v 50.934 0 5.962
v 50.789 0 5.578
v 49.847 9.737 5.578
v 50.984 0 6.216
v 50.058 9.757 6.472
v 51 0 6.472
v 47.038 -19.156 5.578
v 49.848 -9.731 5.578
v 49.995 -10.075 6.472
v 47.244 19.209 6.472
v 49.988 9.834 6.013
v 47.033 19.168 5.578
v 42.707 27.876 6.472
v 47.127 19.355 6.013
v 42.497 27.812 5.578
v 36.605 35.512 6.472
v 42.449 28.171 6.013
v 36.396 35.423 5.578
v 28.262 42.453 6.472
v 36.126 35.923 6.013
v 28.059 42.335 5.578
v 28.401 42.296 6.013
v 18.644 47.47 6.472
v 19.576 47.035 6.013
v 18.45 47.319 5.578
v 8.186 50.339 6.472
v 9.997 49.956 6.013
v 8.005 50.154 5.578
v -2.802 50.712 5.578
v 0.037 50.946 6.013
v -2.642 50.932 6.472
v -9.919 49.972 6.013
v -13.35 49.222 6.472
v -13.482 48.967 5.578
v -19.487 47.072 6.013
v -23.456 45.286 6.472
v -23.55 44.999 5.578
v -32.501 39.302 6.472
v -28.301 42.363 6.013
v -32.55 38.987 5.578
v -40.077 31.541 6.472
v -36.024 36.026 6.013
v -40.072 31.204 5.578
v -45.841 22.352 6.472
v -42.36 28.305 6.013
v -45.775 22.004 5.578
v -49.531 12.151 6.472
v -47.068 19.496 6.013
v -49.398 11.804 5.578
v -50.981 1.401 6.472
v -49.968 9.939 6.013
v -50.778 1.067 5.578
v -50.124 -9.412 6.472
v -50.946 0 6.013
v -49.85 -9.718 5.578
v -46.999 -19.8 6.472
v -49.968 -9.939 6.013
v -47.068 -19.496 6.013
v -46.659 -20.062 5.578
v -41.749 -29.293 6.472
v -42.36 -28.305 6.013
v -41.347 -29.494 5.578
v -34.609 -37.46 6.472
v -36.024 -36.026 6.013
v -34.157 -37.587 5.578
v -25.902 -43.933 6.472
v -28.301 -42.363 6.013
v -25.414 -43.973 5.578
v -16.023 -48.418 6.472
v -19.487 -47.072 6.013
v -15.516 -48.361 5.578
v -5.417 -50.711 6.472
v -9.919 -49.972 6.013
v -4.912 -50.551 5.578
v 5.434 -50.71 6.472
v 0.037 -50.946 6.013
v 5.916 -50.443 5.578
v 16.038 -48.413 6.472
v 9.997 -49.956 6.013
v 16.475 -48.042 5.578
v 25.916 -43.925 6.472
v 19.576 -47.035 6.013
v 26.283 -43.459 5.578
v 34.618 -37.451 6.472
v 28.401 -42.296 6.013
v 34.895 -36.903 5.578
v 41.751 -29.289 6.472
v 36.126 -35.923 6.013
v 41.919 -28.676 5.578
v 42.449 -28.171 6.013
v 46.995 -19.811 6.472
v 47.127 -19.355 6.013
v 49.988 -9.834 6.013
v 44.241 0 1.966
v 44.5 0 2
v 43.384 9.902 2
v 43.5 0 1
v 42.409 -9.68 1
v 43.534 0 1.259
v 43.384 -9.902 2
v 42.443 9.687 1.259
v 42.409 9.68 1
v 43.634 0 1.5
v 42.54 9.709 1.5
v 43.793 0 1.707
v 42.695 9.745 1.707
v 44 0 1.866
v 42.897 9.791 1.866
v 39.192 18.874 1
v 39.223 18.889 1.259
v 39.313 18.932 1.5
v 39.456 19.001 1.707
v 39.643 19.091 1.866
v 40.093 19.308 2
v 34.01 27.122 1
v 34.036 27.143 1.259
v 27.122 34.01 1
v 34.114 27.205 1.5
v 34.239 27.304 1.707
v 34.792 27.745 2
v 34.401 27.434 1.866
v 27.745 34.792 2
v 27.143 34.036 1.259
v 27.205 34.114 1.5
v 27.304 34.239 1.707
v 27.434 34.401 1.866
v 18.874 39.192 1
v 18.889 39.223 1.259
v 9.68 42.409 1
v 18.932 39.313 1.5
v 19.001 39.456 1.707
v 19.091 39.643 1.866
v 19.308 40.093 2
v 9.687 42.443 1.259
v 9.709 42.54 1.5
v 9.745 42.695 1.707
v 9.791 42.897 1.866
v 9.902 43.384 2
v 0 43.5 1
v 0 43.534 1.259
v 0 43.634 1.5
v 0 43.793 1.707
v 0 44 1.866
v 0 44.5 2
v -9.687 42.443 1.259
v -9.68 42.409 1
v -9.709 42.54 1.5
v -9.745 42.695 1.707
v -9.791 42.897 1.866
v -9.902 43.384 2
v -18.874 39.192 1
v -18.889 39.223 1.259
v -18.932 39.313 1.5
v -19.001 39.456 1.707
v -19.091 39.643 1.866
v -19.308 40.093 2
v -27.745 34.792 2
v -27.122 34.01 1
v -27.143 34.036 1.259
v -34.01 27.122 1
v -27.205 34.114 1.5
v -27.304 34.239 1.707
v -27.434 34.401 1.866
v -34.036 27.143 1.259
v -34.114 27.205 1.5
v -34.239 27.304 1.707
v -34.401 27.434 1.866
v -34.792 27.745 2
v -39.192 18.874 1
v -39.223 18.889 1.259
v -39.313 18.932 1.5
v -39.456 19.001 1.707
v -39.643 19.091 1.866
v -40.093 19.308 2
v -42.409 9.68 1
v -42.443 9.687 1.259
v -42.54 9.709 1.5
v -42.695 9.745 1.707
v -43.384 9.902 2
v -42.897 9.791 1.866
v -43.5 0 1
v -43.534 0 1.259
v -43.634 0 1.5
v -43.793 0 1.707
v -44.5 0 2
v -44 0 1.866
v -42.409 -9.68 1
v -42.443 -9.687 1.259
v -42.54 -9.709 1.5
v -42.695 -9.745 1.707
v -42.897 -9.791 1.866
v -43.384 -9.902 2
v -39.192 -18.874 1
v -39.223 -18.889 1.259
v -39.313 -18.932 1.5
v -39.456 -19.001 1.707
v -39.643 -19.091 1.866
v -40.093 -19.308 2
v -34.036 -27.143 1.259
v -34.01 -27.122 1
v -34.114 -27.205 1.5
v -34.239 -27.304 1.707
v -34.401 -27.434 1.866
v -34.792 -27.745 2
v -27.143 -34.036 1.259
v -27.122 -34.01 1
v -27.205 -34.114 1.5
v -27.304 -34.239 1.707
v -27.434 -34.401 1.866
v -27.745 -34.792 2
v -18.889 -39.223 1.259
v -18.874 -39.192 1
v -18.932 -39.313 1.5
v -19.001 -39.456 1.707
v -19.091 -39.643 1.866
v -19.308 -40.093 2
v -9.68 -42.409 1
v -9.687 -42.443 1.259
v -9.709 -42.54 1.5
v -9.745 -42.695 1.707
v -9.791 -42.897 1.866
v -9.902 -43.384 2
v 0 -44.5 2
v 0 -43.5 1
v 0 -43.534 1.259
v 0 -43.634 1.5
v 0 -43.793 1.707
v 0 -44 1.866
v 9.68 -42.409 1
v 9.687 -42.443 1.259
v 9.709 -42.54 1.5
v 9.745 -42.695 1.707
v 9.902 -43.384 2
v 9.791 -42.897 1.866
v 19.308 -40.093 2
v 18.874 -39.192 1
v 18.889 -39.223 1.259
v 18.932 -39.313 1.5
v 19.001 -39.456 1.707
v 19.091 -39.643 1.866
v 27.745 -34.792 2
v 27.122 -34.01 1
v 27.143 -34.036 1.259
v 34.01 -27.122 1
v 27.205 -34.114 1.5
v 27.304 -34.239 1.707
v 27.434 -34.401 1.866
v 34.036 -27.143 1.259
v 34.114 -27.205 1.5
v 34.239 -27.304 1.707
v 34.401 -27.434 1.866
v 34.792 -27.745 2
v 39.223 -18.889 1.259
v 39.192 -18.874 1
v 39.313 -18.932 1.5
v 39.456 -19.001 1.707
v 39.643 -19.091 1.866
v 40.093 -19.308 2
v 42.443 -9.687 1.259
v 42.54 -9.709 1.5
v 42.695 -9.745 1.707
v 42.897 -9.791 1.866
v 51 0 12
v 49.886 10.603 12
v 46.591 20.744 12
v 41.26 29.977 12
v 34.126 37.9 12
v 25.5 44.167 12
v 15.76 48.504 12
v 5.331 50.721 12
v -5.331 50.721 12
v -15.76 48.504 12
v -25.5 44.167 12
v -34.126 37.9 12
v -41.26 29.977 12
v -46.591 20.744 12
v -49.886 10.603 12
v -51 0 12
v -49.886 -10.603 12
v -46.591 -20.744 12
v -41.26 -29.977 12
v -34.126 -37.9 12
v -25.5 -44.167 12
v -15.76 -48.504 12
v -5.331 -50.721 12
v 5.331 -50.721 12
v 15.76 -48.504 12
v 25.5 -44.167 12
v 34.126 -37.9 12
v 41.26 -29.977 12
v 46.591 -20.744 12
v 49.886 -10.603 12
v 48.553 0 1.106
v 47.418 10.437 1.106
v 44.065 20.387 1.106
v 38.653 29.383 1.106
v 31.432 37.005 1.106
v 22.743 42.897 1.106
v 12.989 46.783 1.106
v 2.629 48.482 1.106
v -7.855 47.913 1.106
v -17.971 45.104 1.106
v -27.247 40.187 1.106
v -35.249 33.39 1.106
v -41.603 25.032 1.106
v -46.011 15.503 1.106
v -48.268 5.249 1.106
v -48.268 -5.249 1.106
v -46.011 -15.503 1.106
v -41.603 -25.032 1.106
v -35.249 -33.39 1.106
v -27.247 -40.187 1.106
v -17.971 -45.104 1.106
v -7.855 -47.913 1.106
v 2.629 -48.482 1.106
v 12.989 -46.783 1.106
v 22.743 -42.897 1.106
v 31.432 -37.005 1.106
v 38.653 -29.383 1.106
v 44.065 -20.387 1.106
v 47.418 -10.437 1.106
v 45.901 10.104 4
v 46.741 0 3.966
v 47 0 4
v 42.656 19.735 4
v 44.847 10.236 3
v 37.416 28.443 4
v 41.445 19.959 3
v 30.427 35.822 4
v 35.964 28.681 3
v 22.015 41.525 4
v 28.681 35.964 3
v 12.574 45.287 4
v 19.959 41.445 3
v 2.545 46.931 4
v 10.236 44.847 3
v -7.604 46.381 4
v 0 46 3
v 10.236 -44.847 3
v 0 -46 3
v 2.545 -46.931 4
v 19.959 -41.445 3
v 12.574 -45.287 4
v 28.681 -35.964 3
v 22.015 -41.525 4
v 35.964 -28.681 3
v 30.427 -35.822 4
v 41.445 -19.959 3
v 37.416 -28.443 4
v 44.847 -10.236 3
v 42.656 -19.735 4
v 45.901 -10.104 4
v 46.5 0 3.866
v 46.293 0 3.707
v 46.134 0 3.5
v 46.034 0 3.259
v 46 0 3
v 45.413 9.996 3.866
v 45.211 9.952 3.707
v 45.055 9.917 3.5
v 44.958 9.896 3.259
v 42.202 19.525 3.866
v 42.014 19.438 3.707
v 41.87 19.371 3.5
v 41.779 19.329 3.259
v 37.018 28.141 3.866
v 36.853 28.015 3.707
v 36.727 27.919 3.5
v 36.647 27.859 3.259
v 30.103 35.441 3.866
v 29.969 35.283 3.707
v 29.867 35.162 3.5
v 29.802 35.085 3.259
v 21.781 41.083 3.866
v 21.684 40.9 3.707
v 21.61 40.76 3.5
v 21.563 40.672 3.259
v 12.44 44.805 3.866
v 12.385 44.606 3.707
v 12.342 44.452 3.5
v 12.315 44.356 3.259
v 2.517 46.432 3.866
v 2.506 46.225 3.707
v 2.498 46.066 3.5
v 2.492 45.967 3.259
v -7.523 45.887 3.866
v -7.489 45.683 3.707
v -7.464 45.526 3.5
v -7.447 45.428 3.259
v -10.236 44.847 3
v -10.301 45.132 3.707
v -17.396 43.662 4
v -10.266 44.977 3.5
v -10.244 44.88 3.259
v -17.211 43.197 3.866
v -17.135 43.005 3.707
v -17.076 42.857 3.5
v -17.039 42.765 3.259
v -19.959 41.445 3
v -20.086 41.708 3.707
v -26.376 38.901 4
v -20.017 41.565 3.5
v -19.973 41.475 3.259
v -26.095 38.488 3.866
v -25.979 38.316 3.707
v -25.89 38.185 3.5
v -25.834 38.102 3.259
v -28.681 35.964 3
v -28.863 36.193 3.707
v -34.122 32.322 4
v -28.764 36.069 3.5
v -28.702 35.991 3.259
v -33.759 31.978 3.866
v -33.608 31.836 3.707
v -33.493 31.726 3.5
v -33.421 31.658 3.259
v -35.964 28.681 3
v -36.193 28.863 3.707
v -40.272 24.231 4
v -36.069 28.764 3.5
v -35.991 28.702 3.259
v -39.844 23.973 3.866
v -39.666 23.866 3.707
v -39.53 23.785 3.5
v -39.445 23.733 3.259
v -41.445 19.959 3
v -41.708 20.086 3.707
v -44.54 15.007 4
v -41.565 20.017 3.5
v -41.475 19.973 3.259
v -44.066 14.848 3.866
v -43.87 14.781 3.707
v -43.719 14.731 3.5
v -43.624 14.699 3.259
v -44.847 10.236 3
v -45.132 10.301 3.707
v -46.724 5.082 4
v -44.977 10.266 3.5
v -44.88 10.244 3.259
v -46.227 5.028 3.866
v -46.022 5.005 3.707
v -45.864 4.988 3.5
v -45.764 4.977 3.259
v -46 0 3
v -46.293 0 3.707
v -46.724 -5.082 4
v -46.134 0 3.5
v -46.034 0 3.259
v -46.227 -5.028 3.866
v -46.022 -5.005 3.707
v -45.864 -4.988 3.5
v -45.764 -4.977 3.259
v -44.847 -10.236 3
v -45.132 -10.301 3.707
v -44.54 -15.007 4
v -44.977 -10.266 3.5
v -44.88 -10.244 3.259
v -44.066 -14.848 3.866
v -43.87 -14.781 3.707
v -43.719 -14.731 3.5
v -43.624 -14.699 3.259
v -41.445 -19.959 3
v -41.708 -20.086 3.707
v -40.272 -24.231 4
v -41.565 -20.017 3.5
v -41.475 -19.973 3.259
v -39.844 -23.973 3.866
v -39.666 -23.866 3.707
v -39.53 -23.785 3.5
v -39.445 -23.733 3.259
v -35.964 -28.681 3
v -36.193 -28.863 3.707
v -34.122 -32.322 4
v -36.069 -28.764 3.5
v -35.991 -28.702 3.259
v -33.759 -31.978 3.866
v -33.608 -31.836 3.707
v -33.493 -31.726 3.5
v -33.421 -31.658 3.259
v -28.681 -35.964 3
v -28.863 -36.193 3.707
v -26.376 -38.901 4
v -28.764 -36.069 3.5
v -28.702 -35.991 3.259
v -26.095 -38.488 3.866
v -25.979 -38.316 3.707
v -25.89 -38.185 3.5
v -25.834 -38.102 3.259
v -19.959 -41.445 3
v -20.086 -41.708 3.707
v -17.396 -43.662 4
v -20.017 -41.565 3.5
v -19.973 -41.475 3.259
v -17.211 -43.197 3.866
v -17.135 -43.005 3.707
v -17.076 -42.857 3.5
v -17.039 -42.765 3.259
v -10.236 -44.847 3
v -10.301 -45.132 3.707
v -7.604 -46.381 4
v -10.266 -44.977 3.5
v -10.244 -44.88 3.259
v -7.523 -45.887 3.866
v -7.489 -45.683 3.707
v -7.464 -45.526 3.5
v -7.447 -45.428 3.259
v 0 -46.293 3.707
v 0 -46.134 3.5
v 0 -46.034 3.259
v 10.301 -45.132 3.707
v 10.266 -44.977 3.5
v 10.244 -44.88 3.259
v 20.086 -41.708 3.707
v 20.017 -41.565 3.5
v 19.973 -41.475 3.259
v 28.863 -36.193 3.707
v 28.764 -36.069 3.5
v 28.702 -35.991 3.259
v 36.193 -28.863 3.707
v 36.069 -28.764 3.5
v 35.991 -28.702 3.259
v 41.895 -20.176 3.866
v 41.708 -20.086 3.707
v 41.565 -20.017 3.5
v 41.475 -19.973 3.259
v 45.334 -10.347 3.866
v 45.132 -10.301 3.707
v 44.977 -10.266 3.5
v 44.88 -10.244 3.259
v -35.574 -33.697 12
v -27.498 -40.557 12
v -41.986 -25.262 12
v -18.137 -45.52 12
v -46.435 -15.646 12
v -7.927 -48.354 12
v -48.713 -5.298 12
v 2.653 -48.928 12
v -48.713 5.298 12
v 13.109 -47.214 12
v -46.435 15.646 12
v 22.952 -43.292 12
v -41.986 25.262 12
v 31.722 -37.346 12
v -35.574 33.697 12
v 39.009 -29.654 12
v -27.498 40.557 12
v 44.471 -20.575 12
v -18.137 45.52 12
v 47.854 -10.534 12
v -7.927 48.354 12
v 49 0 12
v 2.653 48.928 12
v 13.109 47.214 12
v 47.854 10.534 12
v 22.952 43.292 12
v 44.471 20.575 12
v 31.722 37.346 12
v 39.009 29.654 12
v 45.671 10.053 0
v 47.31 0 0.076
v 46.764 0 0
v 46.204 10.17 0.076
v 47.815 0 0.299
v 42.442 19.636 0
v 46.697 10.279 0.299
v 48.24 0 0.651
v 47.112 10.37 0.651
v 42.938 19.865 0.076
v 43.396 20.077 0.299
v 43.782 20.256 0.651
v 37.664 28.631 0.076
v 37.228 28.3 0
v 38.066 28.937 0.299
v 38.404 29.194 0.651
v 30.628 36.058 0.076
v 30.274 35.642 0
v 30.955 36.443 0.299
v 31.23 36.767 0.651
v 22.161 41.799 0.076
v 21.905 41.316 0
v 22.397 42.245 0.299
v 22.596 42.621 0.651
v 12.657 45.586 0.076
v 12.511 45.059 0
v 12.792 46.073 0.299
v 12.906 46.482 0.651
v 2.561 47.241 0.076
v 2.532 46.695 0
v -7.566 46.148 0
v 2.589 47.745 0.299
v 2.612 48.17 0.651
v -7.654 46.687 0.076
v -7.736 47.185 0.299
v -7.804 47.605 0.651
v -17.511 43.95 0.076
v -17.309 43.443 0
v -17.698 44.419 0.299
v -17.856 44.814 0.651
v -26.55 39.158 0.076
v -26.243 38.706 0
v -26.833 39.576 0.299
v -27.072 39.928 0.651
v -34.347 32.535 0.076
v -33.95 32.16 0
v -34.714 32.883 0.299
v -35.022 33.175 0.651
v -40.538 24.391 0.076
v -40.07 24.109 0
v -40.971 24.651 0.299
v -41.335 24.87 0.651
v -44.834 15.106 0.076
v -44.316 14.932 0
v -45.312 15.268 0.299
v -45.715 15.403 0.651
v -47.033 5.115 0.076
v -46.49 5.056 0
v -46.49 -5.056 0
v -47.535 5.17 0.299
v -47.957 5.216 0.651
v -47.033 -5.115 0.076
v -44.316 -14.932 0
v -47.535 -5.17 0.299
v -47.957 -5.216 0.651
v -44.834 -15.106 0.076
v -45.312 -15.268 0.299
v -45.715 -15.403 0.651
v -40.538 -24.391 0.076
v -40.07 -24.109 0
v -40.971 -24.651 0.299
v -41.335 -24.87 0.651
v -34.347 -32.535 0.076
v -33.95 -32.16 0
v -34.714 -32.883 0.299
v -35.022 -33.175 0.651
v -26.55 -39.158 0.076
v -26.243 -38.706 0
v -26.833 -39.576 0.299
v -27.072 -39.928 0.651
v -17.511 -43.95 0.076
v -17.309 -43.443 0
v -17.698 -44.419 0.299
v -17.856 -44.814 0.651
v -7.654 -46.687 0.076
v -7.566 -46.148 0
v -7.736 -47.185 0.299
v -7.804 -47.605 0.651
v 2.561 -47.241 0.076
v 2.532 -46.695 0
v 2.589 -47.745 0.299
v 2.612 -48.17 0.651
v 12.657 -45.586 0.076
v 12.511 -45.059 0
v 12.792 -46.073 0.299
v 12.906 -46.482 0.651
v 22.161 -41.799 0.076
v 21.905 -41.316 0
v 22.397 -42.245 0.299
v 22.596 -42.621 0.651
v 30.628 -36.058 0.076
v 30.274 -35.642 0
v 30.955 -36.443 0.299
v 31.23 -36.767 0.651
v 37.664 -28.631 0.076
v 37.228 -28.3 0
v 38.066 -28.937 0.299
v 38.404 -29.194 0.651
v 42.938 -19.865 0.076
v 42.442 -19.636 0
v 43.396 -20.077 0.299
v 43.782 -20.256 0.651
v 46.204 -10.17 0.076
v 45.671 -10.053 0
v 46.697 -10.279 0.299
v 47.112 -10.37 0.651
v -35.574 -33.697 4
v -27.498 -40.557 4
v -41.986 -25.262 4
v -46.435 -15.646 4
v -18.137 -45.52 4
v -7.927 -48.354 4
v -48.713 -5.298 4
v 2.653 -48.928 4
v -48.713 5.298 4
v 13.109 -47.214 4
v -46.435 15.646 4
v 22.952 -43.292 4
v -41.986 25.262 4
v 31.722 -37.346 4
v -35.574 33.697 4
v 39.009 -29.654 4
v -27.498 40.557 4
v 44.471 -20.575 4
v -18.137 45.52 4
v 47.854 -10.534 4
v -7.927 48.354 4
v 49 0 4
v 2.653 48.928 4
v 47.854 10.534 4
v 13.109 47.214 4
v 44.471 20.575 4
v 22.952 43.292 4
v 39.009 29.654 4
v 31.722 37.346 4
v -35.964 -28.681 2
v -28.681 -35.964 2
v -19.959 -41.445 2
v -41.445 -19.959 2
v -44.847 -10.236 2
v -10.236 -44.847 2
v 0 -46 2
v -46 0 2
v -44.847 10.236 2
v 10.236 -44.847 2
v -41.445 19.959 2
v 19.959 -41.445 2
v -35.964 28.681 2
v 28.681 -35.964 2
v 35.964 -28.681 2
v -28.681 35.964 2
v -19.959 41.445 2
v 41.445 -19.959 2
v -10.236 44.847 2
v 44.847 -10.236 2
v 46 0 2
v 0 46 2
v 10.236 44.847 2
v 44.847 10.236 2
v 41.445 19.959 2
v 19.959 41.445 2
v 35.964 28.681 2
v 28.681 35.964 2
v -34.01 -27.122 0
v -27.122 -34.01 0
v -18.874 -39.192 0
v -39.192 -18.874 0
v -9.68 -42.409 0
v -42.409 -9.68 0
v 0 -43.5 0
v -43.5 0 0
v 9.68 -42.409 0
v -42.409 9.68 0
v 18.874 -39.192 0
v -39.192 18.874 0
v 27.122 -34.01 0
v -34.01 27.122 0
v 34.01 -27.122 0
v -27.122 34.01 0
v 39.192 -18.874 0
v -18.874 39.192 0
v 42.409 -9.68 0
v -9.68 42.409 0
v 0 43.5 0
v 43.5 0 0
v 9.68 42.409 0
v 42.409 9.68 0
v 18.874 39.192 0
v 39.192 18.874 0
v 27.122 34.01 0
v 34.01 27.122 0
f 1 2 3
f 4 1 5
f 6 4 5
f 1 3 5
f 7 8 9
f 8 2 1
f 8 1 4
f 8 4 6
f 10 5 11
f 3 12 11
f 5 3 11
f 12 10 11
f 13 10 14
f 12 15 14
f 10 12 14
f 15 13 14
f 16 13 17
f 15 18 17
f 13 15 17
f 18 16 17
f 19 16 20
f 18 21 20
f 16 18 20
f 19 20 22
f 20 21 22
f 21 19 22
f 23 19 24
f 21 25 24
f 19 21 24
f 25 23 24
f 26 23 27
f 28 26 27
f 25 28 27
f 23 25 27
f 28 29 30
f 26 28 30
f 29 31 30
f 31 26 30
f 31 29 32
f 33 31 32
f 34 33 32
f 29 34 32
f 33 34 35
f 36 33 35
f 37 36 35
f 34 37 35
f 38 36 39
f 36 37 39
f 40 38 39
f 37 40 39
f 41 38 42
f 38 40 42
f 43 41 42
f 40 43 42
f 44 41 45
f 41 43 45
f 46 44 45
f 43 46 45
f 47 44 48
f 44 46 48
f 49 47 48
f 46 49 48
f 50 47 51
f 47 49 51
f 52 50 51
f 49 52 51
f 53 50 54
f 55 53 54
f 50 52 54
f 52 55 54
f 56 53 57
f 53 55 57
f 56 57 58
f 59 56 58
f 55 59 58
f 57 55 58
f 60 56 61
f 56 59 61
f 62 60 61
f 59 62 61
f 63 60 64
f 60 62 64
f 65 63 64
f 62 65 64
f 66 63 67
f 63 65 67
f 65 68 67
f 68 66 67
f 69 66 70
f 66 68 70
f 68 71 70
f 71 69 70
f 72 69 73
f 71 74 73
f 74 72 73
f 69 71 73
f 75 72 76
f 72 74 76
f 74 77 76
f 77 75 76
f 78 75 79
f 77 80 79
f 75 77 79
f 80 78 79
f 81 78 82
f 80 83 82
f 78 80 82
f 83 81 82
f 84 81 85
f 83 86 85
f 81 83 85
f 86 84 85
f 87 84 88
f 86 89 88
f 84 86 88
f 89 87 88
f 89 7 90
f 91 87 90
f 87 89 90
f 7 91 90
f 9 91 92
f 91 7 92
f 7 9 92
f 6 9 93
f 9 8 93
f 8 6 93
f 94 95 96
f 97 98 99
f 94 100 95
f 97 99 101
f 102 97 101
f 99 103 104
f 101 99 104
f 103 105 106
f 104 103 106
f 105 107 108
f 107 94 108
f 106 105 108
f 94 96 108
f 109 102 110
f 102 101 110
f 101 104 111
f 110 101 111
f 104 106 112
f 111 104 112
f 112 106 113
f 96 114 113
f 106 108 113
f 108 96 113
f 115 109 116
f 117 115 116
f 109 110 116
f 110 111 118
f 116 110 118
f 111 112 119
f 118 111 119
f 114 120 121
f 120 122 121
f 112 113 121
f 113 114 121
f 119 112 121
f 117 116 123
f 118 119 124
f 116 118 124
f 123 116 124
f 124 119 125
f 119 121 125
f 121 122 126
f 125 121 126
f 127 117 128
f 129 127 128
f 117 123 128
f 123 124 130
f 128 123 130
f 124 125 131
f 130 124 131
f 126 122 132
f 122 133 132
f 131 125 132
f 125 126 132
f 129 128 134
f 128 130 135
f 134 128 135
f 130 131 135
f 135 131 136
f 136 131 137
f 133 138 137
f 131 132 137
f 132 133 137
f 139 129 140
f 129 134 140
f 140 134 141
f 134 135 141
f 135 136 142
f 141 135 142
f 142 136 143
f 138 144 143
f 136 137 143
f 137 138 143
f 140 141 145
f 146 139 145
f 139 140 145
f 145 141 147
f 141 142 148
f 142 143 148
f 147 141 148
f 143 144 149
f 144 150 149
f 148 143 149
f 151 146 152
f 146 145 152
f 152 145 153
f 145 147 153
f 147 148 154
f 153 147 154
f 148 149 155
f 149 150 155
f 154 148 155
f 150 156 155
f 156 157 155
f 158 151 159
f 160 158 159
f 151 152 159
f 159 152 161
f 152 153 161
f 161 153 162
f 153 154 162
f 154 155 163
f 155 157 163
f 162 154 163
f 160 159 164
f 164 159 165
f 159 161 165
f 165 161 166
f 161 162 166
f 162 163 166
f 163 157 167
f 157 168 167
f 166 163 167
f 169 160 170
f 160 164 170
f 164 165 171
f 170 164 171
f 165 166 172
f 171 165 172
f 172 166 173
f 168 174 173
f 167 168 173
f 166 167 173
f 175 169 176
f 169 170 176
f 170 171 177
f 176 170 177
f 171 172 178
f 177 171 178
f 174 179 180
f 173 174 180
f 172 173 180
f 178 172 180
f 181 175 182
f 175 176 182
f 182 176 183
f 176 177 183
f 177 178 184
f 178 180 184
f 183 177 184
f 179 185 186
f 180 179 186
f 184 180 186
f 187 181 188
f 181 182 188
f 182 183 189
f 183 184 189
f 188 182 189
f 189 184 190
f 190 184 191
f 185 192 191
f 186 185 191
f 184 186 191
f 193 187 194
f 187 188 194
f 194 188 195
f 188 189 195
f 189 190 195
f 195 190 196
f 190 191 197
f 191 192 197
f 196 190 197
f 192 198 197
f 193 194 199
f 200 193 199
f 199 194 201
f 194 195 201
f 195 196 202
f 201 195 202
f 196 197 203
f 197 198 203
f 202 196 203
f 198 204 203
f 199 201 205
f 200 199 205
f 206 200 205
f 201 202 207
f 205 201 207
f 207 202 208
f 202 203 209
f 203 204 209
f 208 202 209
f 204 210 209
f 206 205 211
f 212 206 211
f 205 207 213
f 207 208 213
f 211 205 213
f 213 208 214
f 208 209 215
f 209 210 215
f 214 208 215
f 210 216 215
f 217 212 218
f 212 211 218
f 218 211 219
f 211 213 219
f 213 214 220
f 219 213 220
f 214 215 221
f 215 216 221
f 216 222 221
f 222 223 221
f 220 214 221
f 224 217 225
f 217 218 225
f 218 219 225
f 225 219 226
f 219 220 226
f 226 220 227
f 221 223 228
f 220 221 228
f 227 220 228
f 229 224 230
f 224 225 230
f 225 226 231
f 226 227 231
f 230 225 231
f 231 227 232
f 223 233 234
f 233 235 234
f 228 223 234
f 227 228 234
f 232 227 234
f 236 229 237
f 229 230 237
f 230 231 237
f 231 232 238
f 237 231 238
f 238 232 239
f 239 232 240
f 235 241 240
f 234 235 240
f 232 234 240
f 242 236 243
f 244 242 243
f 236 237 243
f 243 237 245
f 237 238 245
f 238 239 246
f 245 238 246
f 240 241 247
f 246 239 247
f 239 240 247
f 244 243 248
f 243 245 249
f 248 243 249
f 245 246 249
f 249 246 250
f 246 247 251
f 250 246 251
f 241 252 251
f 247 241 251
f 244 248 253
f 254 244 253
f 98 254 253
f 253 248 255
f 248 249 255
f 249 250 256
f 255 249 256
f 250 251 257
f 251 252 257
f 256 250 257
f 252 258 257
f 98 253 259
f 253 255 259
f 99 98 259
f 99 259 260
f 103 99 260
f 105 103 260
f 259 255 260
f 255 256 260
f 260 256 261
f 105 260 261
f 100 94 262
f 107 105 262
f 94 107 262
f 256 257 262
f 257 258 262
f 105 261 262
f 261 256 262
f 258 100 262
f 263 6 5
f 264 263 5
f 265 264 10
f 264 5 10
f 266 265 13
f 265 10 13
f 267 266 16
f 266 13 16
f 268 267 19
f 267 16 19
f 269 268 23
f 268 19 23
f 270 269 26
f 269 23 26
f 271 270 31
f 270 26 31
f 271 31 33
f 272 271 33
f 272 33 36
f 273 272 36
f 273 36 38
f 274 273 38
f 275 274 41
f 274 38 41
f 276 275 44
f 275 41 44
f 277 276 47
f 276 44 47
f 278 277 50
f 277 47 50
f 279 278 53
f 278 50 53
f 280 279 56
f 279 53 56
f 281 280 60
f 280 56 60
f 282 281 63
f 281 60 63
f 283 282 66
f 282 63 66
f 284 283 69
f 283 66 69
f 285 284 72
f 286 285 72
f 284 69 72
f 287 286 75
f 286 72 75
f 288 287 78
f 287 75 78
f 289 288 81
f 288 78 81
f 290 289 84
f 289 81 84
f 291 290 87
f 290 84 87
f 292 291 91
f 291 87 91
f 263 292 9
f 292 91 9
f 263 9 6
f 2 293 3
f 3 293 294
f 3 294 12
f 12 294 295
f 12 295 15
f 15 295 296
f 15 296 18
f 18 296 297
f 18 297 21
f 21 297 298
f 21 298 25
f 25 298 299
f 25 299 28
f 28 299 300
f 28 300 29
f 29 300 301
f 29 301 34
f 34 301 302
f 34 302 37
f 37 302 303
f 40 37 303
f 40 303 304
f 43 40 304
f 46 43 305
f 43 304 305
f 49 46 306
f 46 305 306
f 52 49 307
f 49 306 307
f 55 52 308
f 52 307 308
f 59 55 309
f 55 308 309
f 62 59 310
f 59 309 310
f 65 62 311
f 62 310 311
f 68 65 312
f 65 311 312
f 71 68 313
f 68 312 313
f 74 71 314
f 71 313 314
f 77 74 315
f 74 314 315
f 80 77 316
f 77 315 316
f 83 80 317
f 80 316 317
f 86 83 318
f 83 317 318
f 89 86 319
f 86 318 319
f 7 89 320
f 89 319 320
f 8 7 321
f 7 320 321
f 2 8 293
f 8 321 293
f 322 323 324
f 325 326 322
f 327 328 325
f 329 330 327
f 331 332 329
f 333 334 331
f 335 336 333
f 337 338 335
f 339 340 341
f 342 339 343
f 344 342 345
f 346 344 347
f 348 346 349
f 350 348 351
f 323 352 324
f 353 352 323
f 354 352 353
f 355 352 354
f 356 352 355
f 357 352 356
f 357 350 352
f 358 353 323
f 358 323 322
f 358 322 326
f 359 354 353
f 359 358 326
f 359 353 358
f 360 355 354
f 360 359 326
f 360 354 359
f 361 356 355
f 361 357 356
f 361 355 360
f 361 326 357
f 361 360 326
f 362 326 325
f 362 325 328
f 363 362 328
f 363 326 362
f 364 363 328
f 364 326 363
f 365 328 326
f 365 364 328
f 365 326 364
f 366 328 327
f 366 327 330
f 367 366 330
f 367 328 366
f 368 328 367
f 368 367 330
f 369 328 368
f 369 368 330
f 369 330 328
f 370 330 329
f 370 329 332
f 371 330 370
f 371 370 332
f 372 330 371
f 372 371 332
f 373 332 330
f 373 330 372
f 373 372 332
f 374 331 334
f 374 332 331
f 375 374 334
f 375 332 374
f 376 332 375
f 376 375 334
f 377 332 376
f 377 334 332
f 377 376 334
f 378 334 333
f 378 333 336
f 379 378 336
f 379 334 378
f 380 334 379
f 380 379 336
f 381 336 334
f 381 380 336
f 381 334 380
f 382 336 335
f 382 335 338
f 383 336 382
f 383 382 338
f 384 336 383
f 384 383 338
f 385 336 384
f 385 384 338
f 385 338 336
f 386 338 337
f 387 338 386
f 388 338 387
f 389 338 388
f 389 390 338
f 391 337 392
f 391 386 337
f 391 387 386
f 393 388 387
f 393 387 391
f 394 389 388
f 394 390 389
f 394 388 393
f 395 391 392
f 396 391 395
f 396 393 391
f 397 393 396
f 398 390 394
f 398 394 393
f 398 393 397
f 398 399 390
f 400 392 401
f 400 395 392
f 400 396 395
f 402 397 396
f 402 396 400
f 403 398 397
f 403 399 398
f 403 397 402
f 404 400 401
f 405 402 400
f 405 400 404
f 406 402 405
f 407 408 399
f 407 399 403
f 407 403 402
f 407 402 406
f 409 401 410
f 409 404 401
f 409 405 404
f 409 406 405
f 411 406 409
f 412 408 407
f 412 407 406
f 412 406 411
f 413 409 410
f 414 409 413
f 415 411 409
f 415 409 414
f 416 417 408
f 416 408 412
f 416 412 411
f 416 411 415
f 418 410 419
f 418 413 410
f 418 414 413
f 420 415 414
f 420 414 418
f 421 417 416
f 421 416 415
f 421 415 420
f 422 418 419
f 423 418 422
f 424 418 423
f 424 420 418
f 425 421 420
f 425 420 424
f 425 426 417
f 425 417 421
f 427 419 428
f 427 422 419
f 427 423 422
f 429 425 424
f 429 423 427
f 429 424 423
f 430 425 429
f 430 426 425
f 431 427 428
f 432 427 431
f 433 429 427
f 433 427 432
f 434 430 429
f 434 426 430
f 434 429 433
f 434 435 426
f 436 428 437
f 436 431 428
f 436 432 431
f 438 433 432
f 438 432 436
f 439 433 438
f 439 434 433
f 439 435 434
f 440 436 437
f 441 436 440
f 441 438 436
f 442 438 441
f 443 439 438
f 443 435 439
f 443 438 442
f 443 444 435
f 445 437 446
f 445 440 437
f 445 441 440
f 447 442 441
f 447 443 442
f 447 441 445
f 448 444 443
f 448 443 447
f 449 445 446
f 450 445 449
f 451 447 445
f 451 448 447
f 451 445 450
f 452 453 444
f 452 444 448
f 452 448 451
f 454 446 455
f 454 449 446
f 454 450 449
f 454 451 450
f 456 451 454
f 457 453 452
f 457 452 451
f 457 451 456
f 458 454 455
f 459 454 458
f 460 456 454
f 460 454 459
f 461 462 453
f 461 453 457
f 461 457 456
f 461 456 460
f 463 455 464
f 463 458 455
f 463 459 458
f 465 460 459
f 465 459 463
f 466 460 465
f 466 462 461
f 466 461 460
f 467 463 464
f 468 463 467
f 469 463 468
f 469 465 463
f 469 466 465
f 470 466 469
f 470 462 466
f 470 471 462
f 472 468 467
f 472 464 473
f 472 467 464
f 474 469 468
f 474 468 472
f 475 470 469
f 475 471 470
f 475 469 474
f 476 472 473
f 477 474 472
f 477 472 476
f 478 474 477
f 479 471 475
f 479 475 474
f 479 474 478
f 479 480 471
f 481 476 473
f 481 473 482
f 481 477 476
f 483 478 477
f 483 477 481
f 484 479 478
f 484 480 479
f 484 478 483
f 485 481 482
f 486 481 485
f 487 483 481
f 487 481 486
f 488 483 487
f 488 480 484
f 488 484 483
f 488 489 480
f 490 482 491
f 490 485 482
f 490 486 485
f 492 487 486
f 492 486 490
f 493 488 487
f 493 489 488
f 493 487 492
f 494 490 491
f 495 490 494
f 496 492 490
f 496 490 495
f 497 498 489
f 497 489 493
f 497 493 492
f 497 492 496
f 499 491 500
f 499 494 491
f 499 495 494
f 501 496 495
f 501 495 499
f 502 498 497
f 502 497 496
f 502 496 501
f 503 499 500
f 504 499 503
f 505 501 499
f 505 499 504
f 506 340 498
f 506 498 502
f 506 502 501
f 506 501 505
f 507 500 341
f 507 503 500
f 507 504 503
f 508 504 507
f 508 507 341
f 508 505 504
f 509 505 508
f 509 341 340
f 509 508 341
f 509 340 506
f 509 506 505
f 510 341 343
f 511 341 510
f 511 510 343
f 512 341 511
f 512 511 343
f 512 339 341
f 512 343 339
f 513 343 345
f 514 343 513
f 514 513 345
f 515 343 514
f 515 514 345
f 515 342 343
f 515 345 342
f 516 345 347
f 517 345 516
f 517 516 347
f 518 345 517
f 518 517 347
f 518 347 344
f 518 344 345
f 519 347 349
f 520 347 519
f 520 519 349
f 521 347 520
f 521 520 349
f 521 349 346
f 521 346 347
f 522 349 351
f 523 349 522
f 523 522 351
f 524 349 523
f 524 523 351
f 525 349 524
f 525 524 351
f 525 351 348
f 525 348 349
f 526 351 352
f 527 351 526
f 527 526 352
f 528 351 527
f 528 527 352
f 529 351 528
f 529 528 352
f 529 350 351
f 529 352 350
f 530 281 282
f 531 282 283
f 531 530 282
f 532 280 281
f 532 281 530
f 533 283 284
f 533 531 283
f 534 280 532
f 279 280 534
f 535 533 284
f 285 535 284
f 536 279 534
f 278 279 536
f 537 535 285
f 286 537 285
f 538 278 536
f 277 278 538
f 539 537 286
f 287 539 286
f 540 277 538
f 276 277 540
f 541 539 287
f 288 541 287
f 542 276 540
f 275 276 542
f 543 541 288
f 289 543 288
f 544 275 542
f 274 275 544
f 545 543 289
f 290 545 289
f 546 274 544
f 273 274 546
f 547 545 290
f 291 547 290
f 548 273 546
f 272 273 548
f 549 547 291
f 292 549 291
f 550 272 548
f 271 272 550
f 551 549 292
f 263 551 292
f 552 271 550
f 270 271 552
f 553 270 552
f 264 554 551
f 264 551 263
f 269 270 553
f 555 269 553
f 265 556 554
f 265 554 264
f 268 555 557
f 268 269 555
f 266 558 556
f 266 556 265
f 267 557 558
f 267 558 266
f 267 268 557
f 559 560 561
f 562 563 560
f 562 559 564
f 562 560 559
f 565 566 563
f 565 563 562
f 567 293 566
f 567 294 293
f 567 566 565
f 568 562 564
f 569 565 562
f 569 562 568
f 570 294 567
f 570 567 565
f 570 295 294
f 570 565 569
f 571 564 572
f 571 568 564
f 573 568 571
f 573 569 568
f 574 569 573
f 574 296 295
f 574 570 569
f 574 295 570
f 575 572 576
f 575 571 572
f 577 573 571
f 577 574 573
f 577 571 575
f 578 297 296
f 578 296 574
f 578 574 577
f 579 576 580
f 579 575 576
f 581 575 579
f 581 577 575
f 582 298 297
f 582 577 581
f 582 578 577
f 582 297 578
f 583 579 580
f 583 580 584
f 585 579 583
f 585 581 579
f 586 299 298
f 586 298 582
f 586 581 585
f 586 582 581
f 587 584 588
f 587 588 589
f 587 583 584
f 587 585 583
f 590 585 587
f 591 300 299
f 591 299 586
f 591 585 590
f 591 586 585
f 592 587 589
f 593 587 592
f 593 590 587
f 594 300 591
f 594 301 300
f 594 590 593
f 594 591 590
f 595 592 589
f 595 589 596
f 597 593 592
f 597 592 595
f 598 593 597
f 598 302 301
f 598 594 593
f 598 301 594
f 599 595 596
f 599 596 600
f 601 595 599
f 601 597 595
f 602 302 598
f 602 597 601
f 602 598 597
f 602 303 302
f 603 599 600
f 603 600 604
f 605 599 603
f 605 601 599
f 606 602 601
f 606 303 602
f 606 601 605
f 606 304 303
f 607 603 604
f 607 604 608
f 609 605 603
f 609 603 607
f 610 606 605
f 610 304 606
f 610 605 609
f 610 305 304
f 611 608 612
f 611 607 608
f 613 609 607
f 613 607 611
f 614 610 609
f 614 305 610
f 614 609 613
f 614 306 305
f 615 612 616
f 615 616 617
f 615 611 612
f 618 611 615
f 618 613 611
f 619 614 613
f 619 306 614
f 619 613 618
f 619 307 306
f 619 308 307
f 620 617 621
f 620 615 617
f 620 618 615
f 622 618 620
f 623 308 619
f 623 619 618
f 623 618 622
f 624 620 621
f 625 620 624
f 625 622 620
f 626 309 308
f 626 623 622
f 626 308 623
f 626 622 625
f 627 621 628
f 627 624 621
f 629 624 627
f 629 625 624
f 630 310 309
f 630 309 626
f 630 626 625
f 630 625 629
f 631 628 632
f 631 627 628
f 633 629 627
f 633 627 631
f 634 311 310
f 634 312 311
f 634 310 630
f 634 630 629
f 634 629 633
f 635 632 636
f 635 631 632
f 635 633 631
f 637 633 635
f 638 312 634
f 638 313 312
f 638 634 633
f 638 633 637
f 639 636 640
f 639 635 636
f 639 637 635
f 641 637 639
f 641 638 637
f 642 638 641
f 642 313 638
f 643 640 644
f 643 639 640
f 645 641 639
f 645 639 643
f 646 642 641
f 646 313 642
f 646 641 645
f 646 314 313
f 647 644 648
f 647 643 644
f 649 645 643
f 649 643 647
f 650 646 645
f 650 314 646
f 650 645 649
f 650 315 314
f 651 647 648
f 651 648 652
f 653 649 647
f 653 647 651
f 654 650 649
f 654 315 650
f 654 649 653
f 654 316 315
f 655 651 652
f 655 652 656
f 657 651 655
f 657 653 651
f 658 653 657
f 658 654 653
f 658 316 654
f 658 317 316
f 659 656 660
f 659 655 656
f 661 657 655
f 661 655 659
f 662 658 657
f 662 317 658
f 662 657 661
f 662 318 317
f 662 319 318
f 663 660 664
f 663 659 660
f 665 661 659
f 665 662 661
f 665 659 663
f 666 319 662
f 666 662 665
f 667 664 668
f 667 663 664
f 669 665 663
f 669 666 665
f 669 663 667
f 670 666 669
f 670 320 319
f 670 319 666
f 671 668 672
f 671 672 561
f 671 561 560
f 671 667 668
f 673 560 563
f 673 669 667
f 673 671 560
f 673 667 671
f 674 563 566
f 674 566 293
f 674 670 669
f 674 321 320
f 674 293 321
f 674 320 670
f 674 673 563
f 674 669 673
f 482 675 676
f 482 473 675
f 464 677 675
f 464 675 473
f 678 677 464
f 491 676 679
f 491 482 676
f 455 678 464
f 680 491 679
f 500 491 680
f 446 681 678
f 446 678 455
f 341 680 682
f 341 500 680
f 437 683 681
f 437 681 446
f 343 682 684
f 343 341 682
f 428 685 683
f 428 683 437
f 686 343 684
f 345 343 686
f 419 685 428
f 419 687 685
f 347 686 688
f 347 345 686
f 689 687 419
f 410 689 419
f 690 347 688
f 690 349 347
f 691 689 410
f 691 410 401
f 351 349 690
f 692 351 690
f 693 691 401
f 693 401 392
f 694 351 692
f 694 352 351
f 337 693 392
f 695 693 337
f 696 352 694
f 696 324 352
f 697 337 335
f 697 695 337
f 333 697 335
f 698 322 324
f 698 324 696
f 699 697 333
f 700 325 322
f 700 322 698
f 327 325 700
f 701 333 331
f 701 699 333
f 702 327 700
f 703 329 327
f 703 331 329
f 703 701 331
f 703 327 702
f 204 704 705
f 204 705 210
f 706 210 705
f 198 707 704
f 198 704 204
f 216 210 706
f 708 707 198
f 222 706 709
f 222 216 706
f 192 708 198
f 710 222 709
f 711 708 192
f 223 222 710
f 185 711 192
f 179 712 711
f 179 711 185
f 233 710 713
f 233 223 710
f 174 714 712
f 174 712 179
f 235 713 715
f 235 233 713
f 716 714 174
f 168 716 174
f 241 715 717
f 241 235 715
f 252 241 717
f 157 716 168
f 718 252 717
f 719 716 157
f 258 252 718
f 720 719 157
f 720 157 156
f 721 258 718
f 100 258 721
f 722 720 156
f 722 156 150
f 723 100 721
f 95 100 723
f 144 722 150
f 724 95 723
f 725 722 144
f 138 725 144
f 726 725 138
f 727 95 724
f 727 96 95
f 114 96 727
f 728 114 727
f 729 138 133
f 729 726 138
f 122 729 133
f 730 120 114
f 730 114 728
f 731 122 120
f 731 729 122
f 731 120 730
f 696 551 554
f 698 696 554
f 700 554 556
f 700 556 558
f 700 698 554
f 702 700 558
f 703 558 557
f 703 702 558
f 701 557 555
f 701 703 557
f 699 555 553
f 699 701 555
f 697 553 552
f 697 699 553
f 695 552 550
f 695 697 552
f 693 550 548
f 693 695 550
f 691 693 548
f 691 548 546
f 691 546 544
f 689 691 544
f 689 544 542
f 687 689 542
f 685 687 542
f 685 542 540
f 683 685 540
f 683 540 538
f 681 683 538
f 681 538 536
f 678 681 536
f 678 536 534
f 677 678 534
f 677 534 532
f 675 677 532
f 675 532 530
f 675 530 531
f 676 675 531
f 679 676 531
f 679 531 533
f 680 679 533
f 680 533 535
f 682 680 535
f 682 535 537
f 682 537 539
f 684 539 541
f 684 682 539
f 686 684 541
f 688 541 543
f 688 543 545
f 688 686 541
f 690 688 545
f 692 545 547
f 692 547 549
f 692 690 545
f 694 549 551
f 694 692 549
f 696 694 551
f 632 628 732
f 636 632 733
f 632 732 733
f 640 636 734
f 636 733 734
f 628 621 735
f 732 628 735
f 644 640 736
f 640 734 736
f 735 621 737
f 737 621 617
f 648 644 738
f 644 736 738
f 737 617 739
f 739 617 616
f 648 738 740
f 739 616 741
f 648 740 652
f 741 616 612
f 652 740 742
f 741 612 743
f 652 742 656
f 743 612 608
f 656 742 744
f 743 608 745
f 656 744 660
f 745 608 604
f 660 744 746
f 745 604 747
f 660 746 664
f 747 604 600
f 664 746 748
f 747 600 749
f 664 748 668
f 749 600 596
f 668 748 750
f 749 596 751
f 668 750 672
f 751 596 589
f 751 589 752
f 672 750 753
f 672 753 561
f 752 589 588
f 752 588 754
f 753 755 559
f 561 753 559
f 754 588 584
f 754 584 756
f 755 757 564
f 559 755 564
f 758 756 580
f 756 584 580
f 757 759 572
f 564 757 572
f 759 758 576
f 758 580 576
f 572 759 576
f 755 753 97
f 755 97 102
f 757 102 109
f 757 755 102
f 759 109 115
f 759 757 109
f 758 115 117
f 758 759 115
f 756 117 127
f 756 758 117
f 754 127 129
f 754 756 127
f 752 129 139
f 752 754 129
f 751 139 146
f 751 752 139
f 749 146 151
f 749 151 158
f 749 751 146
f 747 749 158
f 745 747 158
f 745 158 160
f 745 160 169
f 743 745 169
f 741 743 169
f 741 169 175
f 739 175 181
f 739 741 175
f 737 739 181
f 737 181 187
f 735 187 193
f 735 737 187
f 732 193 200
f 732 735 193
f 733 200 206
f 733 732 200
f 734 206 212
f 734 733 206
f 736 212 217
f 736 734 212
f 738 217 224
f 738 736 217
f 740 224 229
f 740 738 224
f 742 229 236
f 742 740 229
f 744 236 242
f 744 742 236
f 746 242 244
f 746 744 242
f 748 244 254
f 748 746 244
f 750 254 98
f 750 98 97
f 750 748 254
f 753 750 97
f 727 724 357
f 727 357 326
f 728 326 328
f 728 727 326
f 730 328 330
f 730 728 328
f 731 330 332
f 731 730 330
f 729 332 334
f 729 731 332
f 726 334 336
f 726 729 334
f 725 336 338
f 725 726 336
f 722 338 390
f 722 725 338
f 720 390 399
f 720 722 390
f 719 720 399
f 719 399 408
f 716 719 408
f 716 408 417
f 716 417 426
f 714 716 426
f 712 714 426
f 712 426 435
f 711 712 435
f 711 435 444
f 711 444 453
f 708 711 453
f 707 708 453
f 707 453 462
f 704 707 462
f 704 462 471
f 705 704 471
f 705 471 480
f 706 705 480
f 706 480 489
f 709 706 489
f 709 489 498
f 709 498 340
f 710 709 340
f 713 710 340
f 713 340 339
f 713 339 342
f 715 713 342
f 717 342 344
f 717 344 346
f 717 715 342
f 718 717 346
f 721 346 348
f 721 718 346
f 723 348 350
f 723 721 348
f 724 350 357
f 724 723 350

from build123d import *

# Parameters (mm, degrees)
F0_R     = 46
F0_R_2   = 43.5
F1_DEPTH = 2
F0_R_3   = 49
F2_DEPTH = 4
F0_R_4   = 51
F3_DEPTH = 12
F4_R     = 1
F5_SIZE2 = 3
F5_SIZE  = 6
F6_R     = 2


with BuildPart() as f1:
    # F0 (on Top) → F1 (new body)
    with BuildSketch(Plane.XY):
        Circle(F0_R)
        Circle(F0_R_2, mode=Mode.SUBTRACT)
    extrude(amount=F1_DEPTH)

    # F0 (on Top) → F2 (join)
    with BuildSketch(Plane.XY):
        Circle(F0_R_3)
        Circle(F0_R, mode=Mode.SUBTRACT)
    extrude(amount=F2_DEPTH)

    # F0 (on Top) → F3 (join)
    with BuildSketch(Plane.XY):
        Circle(F0_R_4)
        Circle(F0_R_3, mode=Mode.SUBTRACT)
    extrude(amount=F3_DEPTH)

    # F4
    f4_edges = [f1.edges().sort_by_distance(p)[0] for p in [
        (-43.5, 0, 2),
        (-46, 0, 4),
    ]]
    fillet(f4_edges, radius=F4_R)

    # F5
    f5_edges = [f1.edges().sort_by_distance(p)[0] for p in [
        (-51, 0, 0),
    ]]
    f5_side = f1.faces().sort_by_distance((-51, 0, 6))[0]
    chamfer(f5_edges, length=F5_SIZE, length2=F5_SIZE2, reference=f5_side)

    # F6
    f6_edges = [f1.edges().sort_by_distance(p)[0] for p in [
        (-51, 0, 6),
        (49.5, 0, 3),
        (-48, 0, 0),
    ]]
    fillet(f6_edges, radius=F6_R)


solid = f1.part
